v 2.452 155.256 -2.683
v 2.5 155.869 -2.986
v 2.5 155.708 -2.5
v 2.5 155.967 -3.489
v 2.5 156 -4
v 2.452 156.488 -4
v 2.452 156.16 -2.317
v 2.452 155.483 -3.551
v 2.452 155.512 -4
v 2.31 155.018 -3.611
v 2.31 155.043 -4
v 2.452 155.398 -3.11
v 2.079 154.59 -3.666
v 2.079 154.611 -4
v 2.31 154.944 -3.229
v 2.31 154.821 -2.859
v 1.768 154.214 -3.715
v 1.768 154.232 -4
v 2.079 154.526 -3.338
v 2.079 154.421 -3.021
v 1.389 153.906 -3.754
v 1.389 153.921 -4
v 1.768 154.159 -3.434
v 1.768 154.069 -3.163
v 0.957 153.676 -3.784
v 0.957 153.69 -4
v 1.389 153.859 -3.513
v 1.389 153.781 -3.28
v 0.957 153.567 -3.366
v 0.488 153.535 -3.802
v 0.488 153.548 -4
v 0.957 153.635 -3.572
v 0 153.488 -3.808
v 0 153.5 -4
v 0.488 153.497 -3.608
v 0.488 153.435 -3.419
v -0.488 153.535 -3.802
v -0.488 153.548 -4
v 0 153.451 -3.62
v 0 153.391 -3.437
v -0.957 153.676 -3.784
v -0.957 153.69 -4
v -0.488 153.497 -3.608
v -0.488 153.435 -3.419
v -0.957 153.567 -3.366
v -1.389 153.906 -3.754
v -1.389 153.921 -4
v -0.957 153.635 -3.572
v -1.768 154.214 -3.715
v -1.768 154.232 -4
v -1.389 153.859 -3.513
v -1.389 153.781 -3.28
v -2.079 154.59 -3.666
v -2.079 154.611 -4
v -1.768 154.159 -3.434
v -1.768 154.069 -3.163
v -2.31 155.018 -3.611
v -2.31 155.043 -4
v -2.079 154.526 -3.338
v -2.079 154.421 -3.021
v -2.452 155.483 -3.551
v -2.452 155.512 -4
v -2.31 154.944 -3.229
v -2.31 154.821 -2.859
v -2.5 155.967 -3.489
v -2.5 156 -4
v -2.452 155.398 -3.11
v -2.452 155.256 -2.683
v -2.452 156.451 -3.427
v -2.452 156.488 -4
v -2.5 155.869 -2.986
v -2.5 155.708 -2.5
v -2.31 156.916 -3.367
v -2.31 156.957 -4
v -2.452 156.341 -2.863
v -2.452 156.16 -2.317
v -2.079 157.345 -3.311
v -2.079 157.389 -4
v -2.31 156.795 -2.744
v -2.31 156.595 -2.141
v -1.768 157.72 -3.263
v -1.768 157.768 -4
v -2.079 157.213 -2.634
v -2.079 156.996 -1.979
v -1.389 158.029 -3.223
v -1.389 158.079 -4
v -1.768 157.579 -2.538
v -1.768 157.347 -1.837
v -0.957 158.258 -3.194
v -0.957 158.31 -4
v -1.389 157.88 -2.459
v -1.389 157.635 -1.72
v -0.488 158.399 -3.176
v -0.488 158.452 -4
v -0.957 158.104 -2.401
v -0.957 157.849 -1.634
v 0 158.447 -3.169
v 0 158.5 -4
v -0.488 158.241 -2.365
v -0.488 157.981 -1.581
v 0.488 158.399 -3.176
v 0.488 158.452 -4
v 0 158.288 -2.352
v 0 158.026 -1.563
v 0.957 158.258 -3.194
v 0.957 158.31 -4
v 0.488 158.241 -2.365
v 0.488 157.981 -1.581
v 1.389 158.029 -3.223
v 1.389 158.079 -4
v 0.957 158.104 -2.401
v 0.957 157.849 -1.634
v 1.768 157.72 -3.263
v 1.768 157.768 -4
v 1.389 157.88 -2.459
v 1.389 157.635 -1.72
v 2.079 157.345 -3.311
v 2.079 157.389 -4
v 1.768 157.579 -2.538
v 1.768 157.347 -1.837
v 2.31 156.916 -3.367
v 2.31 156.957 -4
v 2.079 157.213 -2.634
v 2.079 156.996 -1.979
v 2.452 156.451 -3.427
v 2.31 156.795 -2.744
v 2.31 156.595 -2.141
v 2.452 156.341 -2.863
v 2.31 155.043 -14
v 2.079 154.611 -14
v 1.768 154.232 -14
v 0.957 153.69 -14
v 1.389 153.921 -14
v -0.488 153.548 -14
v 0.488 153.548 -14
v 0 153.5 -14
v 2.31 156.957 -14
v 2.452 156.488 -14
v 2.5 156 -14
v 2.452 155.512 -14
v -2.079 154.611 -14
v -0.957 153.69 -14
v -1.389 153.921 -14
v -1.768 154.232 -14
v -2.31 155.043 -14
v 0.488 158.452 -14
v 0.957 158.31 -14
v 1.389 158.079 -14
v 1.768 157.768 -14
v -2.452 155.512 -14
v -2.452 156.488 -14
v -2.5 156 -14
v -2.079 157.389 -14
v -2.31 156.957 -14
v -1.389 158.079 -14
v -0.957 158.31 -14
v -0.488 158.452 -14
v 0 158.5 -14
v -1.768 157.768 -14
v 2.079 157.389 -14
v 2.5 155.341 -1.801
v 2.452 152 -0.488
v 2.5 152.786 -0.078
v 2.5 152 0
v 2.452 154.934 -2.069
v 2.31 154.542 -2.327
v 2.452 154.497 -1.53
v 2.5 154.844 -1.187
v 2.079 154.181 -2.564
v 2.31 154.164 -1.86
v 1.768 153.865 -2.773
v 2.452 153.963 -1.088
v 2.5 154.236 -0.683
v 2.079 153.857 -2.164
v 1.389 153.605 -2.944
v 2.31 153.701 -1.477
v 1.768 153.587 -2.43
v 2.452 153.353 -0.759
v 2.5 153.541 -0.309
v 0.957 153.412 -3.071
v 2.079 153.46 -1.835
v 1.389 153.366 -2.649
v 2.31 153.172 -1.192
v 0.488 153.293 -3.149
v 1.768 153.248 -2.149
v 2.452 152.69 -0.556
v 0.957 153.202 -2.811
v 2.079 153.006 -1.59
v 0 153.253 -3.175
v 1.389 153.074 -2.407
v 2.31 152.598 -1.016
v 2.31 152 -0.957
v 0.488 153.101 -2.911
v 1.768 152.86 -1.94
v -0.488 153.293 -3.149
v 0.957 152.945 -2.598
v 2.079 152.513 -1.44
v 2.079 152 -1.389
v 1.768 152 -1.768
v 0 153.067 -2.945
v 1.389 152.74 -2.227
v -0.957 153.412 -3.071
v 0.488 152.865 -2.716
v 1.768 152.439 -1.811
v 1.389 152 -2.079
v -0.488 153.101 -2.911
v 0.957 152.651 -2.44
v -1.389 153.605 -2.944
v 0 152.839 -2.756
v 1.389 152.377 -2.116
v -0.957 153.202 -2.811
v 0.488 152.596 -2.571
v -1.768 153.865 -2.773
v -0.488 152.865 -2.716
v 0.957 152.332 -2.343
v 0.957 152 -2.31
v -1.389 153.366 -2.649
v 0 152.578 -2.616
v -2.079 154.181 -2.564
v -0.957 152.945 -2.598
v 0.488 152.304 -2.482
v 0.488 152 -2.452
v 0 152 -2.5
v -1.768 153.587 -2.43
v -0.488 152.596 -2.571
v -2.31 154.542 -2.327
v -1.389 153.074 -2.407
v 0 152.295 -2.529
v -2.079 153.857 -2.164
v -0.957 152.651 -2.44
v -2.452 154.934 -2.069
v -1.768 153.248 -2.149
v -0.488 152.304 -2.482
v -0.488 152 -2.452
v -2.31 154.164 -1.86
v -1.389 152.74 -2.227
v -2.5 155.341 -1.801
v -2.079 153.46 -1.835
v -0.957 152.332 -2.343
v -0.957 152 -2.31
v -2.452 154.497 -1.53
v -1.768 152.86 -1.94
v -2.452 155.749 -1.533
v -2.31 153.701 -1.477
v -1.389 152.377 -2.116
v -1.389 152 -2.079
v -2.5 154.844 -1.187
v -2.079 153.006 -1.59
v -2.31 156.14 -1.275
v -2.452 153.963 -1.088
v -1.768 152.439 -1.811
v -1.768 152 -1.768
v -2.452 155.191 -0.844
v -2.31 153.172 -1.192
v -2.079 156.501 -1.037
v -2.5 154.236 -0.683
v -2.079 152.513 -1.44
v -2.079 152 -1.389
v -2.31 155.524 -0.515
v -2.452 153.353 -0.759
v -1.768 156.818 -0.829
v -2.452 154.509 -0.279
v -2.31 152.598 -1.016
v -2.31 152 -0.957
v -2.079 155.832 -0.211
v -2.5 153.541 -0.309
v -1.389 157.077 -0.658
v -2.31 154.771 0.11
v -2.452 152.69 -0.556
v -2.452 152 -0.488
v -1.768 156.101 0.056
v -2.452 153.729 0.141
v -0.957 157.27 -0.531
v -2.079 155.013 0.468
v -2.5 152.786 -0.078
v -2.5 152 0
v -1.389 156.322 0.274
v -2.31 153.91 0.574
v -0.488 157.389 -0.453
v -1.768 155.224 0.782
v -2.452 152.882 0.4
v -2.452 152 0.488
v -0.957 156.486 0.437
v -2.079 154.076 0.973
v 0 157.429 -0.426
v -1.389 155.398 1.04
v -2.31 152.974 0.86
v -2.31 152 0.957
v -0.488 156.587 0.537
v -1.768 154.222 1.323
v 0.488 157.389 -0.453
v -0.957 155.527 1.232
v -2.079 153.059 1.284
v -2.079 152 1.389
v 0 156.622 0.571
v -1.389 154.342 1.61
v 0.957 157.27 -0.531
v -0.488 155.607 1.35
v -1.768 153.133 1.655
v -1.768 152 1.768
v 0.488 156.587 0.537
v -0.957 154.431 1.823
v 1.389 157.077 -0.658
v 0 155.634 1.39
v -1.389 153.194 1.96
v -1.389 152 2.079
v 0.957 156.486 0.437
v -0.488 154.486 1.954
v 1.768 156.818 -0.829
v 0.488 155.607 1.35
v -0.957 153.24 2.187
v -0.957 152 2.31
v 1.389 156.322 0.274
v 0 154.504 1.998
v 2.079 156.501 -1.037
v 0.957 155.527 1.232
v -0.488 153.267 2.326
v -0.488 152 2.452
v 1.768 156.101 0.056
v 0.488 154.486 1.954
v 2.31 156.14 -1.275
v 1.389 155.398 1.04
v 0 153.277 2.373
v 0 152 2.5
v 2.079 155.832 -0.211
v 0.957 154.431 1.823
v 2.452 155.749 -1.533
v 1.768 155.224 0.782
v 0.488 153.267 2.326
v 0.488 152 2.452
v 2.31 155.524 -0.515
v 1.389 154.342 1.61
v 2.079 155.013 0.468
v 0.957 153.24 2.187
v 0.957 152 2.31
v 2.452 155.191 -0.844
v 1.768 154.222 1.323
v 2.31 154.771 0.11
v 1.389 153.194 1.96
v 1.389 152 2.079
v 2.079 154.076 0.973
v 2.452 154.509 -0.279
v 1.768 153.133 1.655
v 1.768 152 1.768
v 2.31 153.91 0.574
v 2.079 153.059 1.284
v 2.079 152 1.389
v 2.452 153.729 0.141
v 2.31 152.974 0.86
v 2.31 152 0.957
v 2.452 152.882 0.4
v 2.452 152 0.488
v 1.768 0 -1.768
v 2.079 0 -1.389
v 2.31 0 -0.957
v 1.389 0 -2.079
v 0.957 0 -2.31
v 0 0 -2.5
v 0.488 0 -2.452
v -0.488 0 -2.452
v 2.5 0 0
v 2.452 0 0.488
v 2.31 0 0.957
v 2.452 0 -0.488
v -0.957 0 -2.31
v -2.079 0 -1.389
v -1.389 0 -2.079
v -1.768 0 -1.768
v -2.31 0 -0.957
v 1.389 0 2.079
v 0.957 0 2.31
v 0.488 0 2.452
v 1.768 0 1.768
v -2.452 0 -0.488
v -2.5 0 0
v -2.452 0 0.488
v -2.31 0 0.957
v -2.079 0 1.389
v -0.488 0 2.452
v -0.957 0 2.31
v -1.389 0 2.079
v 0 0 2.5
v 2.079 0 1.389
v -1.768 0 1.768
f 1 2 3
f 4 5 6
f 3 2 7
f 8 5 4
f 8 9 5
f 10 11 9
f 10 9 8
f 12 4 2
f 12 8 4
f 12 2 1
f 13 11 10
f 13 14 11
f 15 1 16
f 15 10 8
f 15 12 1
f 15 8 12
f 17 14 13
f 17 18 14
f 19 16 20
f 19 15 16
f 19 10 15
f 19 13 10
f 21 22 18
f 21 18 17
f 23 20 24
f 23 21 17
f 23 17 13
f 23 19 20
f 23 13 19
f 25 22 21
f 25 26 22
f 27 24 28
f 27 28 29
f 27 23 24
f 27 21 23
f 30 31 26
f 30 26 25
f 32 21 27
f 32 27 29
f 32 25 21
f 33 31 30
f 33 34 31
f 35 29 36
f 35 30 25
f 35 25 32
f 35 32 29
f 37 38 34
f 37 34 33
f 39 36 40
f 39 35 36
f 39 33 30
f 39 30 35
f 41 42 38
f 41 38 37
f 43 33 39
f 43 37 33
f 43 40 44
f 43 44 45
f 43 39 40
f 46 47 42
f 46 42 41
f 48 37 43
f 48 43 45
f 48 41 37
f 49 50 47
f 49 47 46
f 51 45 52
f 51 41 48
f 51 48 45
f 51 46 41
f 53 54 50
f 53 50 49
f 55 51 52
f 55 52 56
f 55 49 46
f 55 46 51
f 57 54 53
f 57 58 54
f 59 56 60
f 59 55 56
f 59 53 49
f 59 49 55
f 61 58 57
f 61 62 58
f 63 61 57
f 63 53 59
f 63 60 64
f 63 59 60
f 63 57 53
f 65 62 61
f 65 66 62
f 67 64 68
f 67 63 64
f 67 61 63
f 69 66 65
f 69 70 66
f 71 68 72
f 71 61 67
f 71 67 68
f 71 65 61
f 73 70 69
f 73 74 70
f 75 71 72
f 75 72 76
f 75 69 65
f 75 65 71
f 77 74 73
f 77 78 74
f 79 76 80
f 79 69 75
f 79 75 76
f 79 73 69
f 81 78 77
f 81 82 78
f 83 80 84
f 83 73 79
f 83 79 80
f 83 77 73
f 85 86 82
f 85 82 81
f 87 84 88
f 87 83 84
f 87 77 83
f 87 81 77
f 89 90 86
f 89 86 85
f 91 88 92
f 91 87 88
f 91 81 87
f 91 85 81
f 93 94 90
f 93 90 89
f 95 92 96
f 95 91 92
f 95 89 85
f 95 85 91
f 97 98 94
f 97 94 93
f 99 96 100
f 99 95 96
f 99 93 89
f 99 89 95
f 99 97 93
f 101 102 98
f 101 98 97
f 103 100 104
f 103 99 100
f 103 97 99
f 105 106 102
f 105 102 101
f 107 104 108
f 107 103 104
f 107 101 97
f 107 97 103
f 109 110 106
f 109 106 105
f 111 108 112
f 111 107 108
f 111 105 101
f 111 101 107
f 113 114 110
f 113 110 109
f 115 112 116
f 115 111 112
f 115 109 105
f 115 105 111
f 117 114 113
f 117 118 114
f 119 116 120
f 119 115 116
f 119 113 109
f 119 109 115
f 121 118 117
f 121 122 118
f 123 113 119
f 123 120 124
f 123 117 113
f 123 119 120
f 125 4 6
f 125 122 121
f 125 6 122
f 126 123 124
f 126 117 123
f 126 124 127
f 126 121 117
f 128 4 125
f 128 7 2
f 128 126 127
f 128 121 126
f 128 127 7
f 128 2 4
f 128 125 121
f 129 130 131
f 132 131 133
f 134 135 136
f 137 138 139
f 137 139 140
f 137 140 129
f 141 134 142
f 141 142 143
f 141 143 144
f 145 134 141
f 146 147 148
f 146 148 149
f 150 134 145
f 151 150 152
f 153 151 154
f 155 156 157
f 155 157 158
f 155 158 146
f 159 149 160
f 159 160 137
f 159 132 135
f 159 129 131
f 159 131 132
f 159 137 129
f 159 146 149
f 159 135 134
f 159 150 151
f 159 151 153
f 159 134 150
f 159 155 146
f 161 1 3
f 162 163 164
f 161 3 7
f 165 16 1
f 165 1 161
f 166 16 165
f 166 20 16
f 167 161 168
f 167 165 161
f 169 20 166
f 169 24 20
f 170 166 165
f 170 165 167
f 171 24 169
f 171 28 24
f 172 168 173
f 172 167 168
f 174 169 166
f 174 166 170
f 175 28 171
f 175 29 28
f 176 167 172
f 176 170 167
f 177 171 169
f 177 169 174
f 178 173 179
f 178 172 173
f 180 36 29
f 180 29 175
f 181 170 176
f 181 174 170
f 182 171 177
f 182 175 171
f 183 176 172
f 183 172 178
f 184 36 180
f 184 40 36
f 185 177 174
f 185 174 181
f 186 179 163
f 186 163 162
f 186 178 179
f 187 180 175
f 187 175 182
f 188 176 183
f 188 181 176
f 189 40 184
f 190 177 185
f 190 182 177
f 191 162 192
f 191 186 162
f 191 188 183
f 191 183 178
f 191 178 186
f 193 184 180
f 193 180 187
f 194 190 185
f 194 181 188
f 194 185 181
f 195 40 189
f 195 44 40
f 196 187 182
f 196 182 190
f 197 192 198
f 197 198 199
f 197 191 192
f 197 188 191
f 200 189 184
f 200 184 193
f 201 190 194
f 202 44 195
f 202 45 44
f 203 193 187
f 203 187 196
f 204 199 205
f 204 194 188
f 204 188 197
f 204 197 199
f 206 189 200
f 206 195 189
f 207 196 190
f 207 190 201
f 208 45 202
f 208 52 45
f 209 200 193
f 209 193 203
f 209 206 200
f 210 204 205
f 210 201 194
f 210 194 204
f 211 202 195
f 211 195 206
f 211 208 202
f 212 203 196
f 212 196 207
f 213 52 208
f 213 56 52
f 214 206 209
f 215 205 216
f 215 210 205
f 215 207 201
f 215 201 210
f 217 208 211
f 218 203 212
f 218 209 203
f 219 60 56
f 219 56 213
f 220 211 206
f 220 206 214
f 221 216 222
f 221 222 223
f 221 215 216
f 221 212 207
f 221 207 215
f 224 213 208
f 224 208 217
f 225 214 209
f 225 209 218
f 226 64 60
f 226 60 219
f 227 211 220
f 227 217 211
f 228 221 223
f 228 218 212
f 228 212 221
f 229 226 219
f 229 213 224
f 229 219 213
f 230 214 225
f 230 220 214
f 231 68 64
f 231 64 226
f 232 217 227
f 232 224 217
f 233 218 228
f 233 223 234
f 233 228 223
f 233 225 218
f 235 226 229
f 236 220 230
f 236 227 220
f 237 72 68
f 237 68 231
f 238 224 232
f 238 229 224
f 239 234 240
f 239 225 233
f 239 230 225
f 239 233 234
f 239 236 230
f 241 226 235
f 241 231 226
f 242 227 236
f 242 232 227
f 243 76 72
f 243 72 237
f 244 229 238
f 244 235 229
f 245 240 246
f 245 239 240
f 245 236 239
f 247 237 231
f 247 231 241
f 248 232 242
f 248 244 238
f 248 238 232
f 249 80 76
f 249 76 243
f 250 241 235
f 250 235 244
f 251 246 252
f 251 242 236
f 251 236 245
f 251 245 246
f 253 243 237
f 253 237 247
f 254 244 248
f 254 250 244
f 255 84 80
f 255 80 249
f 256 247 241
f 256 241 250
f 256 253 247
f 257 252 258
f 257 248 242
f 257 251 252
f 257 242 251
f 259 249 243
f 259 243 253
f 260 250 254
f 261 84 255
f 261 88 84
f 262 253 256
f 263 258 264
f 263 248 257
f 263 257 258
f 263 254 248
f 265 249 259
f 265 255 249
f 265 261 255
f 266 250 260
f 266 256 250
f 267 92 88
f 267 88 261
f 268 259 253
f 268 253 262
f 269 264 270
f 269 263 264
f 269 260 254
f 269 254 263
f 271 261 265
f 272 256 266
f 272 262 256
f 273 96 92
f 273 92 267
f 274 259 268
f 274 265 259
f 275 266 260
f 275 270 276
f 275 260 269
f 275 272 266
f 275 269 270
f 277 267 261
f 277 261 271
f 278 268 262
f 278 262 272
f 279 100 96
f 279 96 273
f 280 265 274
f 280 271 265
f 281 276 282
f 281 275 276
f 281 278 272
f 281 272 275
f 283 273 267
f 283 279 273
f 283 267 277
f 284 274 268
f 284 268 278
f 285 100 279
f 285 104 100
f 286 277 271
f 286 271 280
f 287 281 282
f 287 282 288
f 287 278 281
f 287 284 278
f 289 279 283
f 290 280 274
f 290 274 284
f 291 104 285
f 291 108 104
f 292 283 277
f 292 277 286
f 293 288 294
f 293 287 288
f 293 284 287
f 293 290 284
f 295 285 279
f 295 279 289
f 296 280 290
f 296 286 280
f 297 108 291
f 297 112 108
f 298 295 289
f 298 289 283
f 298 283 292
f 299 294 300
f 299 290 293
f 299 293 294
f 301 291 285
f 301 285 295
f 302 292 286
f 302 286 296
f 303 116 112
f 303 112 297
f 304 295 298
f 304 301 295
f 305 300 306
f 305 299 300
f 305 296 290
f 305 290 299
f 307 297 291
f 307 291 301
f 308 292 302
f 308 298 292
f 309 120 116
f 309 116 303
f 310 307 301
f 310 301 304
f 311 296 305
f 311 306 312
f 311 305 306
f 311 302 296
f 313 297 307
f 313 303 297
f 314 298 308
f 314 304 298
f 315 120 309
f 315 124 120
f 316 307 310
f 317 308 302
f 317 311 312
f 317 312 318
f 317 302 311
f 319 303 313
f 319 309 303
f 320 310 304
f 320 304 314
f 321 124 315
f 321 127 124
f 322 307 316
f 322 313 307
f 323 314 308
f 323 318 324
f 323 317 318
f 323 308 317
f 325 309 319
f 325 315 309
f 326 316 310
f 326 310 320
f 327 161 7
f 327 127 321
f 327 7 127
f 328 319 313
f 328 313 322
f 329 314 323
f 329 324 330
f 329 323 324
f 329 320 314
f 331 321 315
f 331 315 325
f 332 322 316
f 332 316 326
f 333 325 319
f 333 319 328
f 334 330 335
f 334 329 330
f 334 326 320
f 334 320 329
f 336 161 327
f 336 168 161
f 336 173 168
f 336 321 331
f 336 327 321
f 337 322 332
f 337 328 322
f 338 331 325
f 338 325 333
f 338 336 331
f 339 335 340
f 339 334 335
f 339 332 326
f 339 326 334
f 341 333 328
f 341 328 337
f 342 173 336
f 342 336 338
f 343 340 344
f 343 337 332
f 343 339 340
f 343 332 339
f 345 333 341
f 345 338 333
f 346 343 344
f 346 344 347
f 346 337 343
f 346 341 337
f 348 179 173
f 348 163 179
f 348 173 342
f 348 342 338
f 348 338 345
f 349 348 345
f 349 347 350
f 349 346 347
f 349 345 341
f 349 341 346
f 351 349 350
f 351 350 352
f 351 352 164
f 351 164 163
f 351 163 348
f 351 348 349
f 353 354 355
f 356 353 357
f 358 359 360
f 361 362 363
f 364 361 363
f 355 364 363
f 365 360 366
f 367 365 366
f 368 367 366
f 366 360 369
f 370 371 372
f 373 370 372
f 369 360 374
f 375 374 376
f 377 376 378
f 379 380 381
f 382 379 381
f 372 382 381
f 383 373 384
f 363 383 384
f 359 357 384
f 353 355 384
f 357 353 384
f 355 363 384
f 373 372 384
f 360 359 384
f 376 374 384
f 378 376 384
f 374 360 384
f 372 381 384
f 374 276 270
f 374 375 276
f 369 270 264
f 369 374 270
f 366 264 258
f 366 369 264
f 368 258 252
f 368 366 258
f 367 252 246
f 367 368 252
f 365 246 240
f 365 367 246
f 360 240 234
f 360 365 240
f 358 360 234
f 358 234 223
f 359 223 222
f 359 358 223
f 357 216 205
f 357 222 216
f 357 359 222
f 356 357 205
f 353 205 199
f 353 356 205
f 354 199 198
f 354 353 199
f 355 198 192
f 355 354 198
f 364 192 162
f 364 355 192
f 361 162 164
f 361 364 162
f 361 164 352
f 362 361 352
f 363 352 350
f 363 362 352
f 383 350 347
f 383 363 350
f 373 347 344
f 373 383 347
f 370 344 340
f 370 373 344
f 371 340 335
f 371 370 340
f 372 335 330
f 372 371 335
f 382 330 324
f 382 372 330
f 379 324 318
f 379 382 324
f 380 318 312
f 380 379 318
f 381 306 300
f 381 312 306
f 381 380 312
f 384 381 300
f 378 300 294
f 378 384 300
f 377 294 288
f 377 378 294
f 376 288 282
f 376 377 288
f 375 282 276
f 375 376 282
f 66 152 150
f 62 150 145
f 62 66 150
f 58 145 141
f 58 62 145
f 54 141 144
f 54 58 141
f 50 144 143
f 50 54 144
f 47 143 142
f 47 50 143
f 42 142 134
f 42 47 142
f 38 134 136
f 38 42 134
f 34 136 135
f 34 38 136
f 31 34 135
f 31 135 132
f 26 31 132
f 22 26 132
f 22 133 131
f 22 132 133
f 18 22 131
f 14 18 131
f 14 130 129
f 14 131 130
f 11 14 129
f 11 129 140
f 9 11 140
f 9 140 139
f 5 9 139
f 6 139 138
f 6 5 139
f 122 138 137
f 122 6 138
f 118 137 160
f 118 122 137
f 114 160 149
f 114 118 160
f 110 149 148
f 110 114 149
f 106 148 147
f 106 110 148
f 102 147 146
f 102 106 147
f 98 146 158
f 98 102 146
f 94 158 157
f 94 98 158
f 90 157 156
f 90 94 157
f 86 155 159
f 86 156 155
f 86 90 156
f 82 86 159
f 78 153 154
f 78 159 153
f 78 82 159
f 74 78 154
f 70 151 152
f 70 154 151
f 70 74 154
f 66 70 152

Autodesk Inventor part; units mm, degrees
ref_plane "YZ Plane" through (0, 0, 0) normal (1, 0, 0) x (0, 1, 0)
ref_plane "XZ Plane" through (0, 0, 0) normal (0, 1, 0) x (-1, 0, 0)
ref_plane "XY Plane" through (0, 0, 0) normal (0, 0, 1) x (1, 0, 0)
sketch "Sketch1" plane through (0, 0, 0) normal (0, 1, 0) x (-1, 0, 0)
  circle A0 centre (0, 0) radius 2.5
  dimension "d0" = 5
extrude "Extrusion1" add sketch "Sketch1" along normal blind 152
sketch "Sketch2" plane through (0, 0, 0) normal (1, 0, 0) x (0, 1, 0)
  arc A0 (148.2919, -2.5) -> (156, -4) centre (152, -4) ccw construction
  line L0 (152, -2.5) -> (152, 2.5) projected
  line L1 (0, -2.5) -> (152, -2.5) projected
  line L2 (0, 2.5) -> (152, 2.5) projected
  arc A1 (152, 0) -> (148.2919, -2.5) centre (152, -4) ccw construction
  arc A2 (155.7081, -2.5) -> (152, 0) centre (152, -4) ccw
  line L3 (152, 0) -> (159.1444, 0) construction
  line L4 (152, -4) -> (156, -4) construction
  arc A3 (156, -4) -> (155.7081, -2.5) centre (152, -4) ccw
  point P0 (0, 0)
  dimension "d3" = 8
sketch "Sketch3" plane through (0, 152, 0) normal (0, 1, 0) x (1, 0, 0)
  circle A0 centre (0, 0) radius 2.5 projected
sweep "Sweep1" add profiles "Sketch3" path "Sketch2" path curves A2 A3
sketch "Sketch4" plane through (0, 156, -4) normal (0, 0, -1) x (-1, 0, 0)
  circle A0 centre (0, 0) radius 2.5 projected
  point P0 (0, -156)
extrude "Extrusion2" add sketch "Sketch4" along normal blind 10
properties part number "Eje" material "Stainless Steel"
